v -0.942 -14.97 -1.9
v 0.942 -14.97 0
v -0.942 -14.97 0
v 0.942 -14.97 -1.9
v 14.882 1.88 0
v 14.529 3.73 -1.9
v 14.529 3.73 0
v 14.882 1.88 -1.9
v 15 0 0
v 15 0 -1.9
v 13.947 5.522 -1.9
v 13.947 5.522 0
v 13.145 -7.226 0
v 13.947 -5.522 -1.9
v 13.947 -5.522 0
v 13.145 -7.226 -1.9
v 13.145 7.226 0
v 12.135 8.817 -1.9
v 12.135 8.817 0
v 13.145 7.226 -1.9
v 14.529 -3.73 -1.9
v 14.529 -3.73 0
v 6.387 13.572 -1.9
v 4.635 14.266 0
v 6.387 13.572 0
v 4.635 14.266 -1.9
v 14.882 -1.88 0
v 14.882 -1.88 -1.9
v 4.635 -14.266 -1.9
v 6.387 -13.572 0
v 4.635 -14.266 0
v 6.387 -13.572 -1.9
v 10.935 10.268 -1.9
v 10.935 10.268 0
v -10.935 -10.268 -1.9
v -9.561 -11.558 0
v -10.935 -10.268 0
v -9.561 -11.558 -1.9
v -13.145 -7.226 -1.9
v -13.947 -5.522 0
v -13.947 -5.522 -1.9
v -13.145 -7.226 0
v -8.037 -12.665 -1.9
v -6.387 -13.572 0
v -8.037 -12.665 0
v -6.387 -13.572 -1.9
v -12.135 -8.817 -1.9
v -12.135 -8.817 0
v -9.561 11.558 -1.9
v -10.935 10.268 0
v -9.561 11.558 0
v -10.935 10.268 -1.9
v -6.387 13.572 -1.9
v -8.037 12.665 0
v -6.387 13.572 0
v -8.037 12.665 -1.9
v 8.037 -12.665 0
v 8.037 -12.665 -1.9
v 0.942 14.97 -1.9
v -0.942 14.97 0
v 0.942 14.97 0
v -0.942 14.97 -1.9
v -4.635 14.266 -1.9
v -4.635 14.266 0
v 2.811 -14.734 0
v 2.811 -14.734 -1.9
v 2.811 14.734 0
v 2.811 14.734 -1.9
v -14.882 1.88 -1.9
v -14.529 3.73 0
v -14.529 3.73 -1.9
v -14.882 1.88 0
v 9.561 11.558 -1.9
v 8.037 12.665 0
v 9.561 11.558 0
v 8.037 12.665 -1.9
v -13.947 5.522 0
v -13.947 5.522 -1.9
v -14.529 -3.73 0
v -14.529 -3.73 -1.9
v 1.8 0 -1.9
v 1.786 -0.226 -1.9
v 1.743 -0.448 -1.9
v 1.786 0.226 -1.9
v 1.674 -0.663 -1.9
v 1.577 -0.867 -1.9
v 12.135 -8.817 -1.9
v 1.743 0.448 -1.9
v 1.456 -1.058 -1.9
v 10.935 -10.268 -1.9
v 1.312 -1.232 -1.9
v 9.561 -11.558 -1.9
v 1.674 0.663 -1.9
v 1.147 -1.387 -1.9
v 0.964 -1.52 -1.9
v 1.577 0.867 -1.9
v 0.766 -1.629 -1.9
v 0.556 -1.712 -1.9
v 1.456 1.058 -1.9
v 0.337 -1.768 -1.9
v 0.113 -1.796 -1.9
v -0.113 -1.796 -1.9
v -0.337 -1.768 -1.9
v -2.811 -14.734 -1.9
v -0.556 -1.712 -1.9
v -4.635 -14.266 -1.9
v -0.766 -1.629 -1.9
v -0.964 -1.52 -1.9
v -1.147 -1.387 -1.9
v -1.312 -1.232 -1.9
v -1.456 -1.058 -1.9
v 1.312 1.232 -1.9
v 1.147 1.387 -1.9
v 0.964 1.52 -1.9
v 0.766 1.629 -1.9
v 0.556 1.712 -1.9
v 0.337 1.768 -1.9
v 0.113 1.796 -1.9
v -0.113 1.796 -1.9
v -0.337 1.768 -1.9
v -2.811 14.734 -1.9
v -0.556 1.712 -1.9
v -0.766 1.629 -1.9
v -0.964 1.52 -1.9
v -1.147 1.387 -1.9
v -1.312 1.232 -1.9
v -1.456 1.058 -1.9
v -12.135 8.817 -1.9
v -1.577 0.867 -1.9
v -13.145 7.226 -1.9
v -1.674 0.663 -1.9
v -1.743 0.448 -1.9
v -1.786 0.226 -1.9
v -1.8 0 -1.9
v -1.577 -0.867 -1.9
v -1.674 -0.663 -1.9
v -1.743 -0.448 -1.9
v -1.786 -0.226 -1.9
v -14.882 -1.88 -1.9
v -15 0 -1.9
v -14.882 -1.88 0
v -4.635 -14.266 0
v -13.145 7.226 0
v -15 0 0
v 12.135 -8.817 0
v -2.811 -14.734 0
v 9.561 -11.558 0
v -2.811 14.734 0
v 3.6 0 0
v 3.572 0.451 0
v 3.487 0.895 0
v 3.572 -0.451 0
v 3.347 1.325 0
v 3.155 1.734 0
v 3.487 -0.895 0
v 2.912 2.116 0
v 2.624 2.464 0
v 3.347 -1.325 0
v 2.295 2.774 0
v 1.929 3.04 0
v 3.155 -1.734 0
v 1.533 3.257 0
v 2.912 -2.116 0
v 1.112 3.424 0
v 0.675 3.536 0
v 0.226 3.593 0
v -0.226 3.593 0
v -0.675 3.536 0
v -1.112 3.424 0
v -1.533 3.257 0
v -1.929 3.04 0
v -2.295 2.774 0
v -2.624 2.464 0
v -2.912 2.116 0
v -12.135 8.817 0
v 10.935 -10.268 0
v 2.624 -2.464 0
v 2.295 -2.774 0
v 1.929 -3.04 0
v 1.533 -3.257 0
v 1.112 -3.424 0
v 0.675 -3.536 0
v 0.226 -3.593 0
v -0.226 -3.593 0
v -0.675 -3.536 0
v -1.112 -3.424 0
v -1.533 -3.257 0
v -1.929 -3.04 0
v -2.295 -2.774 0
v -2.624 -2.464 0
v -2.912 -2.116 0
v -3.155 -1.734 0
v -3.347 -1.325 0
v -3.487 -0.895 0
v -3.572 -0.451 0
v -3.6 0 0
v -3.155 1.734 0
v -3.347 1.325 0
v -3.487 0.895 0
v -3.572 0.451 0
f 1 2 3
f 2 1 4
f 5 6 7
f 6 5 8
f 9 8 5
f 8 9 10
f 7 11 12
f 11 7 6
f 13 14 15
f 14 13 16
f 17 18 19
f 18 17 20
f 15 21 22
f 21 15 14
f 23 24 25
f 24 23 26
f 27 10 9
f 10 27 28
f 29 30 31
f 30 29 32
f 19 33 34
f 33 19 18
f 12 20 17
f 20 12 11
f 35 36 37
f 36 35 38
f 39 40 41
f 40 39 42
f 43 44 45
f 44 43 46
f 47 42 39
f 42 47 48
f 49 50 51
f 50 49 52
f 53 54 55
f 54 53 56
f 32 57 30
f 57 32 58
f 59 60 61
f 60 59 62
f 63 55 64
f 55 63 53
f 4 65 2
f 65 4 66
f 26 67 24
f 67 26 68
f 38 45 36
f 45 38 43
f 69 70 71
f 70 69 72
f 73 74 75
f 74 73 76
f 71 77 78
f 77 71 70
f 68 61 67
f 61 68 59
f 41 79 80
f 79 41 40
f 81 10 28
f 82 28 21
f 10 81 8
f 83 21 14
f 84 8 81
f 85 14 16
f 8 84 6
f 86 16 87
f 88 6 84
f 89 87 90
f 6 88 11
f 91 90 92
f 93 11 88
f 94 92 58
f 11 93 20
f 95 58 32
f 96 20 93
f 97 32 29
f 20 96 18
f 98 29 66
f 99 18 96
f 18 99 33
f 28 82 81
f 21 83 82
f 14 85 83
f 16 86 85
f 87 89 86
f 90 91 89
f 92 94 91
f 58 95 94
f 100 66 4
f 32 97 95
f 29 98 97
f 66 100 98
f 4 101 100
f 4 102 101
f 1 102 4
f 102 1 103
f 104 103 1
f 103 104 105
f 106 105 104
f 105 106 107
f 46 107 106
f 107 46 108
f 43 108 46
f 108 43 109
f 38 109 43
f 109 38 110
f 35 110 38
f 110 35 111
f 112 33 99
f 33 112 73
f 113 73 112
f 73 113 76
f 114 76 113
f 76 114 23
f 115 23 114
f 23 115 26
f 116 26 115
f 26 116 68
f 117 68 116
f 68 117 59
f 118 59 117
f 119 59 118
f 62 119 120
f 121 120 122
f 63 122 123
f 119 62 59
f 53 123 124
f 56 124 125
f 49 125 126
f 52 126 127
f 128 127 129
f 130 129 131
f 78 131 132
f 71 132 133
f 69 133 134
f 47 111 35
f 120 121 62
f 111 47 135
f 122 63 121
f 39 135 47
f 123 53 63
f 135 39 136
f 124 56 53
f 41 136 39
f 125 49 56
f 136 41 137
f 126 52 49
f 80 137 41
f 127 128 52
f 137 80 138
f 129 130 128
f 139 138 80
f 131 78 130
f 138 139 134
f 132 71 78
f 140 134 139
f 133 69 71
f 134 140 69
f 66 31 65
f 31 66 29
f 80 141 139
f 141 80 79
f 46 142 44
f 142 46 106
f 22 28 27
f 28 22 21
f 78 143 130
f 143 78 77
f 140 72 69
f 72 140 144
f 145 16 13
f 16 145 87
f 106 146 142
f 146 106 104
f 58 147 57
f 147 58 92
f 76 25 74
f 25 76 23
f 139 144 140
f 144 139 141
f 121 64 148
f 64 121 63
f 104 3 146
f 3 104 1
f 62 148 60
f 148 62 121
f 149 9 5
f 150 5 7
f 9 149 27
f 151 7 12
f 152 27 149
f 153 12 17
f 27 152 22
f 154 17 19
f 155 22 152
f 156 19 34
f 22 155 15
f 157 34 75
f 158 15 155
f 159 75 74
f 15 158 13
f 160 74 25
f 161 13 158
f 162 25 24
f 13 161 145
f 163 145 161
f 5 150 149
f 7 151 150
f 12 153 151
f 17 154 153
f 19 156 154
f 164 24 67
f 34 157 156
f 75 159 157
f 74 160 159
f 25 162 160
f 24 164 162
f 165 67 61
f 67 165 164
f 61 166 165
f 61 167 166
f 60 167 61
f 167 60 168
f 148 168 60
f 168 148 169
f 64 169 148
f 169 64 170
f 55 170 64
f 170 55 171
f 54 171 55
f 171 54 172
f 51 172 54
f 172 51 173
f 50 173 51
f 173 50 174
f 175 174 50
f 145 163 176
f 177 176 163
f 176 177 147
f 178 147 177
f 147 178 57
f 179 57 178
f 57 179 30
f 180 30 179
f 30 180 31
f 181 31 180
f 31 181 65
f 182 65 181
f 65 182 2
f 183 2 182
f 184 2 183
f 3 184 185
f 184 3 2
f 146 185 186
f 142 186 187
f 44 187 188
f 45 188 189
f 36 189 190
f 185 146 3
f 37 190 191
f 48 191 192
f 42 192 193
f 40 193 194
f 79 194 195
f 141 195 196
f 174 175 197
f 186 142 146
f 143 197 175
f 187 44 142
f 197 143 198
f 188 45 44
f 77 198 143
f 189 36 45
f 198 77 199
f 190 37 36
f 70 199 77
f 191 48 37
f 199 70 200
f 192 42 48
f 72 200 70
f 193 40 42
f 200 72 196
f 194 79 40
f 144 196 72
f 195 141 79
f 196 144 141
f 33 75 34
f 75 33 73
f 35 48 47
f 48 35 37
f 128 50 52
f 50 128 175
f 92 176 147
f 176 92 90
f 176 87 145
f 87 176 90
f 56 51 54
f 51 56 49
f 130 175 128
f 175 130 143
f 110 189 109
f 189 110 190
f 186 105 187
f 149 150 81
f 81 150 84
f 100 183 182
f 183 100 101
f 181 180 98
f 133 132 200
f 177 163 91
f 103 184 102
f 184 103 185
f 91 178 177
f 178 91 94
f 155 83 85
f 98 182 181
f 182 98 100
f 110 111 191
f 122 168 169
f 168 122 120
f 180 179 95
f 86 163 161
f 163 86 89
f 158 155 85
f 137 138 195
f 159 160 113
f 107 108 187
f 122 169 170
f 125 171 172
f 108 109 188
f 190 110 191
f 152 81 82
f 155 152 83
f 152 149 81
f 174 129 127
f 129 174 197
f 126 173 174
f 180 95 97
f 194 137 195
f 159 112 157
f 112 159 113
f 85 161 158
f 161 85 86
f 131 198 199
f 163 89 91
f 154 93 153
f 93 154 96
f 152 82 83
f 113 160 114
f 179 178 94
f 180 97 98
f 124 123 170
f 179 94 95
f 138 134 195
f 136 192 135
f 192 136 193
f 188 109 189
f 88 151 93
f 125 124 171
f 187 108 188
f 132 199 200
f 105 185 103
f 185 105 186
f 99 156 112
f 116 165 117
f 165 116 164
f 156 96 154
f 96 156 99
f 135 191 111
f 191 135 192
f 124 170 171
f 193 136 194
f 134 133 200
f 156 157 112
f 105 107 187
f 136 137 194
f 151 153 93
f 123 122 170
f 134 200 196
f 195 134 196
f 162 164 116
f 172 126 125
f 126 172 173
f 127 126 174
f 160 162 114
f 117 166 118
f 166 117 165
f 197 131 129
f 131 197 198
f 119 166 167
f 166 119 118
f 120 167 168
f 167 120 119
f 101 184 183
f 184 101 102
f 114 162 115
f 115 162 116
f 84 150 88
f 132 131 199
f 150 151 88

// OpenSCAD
$fn = 50;


difference() {
	union() {
		translate(v = [0, 0, -1.9000000000]) {
			cylinder(h = 1.9000000000, r = 15.0000000000);
		}
		translate(v = [0, 0, -1.9000000000]) {
			cylinder(h = 1.9000000000, r = 2.8750000000);
		}
	}
	union() {
		translate(v = [0, 0, 0]) {
			rotate(a = [0, 0, 0]) {
				difference() {
					union() {
						translate(v = [0, 0, -1.9000000000]) {
							cylinder(h = 1.9000000000, r = 1.5000000000);
						}
						translate(v = [0, 0, -1.9000000000]) {
							cylinder(h = 1.9000000000, r1 = 1.8000000000, r2 = 3.6000000000);
						}
						translate(v = [0, 0, -1.9000000000]) {
							cylinder(h = 1.9000000000, r = 1.8000000000);
						}
						translate(v = [0, 0, -1.9000000000]) {
							cylinder(h = 1.9000000000, r = 1.5000000000);
						}
					}
					union();
				}
			}
		}
	}
}
